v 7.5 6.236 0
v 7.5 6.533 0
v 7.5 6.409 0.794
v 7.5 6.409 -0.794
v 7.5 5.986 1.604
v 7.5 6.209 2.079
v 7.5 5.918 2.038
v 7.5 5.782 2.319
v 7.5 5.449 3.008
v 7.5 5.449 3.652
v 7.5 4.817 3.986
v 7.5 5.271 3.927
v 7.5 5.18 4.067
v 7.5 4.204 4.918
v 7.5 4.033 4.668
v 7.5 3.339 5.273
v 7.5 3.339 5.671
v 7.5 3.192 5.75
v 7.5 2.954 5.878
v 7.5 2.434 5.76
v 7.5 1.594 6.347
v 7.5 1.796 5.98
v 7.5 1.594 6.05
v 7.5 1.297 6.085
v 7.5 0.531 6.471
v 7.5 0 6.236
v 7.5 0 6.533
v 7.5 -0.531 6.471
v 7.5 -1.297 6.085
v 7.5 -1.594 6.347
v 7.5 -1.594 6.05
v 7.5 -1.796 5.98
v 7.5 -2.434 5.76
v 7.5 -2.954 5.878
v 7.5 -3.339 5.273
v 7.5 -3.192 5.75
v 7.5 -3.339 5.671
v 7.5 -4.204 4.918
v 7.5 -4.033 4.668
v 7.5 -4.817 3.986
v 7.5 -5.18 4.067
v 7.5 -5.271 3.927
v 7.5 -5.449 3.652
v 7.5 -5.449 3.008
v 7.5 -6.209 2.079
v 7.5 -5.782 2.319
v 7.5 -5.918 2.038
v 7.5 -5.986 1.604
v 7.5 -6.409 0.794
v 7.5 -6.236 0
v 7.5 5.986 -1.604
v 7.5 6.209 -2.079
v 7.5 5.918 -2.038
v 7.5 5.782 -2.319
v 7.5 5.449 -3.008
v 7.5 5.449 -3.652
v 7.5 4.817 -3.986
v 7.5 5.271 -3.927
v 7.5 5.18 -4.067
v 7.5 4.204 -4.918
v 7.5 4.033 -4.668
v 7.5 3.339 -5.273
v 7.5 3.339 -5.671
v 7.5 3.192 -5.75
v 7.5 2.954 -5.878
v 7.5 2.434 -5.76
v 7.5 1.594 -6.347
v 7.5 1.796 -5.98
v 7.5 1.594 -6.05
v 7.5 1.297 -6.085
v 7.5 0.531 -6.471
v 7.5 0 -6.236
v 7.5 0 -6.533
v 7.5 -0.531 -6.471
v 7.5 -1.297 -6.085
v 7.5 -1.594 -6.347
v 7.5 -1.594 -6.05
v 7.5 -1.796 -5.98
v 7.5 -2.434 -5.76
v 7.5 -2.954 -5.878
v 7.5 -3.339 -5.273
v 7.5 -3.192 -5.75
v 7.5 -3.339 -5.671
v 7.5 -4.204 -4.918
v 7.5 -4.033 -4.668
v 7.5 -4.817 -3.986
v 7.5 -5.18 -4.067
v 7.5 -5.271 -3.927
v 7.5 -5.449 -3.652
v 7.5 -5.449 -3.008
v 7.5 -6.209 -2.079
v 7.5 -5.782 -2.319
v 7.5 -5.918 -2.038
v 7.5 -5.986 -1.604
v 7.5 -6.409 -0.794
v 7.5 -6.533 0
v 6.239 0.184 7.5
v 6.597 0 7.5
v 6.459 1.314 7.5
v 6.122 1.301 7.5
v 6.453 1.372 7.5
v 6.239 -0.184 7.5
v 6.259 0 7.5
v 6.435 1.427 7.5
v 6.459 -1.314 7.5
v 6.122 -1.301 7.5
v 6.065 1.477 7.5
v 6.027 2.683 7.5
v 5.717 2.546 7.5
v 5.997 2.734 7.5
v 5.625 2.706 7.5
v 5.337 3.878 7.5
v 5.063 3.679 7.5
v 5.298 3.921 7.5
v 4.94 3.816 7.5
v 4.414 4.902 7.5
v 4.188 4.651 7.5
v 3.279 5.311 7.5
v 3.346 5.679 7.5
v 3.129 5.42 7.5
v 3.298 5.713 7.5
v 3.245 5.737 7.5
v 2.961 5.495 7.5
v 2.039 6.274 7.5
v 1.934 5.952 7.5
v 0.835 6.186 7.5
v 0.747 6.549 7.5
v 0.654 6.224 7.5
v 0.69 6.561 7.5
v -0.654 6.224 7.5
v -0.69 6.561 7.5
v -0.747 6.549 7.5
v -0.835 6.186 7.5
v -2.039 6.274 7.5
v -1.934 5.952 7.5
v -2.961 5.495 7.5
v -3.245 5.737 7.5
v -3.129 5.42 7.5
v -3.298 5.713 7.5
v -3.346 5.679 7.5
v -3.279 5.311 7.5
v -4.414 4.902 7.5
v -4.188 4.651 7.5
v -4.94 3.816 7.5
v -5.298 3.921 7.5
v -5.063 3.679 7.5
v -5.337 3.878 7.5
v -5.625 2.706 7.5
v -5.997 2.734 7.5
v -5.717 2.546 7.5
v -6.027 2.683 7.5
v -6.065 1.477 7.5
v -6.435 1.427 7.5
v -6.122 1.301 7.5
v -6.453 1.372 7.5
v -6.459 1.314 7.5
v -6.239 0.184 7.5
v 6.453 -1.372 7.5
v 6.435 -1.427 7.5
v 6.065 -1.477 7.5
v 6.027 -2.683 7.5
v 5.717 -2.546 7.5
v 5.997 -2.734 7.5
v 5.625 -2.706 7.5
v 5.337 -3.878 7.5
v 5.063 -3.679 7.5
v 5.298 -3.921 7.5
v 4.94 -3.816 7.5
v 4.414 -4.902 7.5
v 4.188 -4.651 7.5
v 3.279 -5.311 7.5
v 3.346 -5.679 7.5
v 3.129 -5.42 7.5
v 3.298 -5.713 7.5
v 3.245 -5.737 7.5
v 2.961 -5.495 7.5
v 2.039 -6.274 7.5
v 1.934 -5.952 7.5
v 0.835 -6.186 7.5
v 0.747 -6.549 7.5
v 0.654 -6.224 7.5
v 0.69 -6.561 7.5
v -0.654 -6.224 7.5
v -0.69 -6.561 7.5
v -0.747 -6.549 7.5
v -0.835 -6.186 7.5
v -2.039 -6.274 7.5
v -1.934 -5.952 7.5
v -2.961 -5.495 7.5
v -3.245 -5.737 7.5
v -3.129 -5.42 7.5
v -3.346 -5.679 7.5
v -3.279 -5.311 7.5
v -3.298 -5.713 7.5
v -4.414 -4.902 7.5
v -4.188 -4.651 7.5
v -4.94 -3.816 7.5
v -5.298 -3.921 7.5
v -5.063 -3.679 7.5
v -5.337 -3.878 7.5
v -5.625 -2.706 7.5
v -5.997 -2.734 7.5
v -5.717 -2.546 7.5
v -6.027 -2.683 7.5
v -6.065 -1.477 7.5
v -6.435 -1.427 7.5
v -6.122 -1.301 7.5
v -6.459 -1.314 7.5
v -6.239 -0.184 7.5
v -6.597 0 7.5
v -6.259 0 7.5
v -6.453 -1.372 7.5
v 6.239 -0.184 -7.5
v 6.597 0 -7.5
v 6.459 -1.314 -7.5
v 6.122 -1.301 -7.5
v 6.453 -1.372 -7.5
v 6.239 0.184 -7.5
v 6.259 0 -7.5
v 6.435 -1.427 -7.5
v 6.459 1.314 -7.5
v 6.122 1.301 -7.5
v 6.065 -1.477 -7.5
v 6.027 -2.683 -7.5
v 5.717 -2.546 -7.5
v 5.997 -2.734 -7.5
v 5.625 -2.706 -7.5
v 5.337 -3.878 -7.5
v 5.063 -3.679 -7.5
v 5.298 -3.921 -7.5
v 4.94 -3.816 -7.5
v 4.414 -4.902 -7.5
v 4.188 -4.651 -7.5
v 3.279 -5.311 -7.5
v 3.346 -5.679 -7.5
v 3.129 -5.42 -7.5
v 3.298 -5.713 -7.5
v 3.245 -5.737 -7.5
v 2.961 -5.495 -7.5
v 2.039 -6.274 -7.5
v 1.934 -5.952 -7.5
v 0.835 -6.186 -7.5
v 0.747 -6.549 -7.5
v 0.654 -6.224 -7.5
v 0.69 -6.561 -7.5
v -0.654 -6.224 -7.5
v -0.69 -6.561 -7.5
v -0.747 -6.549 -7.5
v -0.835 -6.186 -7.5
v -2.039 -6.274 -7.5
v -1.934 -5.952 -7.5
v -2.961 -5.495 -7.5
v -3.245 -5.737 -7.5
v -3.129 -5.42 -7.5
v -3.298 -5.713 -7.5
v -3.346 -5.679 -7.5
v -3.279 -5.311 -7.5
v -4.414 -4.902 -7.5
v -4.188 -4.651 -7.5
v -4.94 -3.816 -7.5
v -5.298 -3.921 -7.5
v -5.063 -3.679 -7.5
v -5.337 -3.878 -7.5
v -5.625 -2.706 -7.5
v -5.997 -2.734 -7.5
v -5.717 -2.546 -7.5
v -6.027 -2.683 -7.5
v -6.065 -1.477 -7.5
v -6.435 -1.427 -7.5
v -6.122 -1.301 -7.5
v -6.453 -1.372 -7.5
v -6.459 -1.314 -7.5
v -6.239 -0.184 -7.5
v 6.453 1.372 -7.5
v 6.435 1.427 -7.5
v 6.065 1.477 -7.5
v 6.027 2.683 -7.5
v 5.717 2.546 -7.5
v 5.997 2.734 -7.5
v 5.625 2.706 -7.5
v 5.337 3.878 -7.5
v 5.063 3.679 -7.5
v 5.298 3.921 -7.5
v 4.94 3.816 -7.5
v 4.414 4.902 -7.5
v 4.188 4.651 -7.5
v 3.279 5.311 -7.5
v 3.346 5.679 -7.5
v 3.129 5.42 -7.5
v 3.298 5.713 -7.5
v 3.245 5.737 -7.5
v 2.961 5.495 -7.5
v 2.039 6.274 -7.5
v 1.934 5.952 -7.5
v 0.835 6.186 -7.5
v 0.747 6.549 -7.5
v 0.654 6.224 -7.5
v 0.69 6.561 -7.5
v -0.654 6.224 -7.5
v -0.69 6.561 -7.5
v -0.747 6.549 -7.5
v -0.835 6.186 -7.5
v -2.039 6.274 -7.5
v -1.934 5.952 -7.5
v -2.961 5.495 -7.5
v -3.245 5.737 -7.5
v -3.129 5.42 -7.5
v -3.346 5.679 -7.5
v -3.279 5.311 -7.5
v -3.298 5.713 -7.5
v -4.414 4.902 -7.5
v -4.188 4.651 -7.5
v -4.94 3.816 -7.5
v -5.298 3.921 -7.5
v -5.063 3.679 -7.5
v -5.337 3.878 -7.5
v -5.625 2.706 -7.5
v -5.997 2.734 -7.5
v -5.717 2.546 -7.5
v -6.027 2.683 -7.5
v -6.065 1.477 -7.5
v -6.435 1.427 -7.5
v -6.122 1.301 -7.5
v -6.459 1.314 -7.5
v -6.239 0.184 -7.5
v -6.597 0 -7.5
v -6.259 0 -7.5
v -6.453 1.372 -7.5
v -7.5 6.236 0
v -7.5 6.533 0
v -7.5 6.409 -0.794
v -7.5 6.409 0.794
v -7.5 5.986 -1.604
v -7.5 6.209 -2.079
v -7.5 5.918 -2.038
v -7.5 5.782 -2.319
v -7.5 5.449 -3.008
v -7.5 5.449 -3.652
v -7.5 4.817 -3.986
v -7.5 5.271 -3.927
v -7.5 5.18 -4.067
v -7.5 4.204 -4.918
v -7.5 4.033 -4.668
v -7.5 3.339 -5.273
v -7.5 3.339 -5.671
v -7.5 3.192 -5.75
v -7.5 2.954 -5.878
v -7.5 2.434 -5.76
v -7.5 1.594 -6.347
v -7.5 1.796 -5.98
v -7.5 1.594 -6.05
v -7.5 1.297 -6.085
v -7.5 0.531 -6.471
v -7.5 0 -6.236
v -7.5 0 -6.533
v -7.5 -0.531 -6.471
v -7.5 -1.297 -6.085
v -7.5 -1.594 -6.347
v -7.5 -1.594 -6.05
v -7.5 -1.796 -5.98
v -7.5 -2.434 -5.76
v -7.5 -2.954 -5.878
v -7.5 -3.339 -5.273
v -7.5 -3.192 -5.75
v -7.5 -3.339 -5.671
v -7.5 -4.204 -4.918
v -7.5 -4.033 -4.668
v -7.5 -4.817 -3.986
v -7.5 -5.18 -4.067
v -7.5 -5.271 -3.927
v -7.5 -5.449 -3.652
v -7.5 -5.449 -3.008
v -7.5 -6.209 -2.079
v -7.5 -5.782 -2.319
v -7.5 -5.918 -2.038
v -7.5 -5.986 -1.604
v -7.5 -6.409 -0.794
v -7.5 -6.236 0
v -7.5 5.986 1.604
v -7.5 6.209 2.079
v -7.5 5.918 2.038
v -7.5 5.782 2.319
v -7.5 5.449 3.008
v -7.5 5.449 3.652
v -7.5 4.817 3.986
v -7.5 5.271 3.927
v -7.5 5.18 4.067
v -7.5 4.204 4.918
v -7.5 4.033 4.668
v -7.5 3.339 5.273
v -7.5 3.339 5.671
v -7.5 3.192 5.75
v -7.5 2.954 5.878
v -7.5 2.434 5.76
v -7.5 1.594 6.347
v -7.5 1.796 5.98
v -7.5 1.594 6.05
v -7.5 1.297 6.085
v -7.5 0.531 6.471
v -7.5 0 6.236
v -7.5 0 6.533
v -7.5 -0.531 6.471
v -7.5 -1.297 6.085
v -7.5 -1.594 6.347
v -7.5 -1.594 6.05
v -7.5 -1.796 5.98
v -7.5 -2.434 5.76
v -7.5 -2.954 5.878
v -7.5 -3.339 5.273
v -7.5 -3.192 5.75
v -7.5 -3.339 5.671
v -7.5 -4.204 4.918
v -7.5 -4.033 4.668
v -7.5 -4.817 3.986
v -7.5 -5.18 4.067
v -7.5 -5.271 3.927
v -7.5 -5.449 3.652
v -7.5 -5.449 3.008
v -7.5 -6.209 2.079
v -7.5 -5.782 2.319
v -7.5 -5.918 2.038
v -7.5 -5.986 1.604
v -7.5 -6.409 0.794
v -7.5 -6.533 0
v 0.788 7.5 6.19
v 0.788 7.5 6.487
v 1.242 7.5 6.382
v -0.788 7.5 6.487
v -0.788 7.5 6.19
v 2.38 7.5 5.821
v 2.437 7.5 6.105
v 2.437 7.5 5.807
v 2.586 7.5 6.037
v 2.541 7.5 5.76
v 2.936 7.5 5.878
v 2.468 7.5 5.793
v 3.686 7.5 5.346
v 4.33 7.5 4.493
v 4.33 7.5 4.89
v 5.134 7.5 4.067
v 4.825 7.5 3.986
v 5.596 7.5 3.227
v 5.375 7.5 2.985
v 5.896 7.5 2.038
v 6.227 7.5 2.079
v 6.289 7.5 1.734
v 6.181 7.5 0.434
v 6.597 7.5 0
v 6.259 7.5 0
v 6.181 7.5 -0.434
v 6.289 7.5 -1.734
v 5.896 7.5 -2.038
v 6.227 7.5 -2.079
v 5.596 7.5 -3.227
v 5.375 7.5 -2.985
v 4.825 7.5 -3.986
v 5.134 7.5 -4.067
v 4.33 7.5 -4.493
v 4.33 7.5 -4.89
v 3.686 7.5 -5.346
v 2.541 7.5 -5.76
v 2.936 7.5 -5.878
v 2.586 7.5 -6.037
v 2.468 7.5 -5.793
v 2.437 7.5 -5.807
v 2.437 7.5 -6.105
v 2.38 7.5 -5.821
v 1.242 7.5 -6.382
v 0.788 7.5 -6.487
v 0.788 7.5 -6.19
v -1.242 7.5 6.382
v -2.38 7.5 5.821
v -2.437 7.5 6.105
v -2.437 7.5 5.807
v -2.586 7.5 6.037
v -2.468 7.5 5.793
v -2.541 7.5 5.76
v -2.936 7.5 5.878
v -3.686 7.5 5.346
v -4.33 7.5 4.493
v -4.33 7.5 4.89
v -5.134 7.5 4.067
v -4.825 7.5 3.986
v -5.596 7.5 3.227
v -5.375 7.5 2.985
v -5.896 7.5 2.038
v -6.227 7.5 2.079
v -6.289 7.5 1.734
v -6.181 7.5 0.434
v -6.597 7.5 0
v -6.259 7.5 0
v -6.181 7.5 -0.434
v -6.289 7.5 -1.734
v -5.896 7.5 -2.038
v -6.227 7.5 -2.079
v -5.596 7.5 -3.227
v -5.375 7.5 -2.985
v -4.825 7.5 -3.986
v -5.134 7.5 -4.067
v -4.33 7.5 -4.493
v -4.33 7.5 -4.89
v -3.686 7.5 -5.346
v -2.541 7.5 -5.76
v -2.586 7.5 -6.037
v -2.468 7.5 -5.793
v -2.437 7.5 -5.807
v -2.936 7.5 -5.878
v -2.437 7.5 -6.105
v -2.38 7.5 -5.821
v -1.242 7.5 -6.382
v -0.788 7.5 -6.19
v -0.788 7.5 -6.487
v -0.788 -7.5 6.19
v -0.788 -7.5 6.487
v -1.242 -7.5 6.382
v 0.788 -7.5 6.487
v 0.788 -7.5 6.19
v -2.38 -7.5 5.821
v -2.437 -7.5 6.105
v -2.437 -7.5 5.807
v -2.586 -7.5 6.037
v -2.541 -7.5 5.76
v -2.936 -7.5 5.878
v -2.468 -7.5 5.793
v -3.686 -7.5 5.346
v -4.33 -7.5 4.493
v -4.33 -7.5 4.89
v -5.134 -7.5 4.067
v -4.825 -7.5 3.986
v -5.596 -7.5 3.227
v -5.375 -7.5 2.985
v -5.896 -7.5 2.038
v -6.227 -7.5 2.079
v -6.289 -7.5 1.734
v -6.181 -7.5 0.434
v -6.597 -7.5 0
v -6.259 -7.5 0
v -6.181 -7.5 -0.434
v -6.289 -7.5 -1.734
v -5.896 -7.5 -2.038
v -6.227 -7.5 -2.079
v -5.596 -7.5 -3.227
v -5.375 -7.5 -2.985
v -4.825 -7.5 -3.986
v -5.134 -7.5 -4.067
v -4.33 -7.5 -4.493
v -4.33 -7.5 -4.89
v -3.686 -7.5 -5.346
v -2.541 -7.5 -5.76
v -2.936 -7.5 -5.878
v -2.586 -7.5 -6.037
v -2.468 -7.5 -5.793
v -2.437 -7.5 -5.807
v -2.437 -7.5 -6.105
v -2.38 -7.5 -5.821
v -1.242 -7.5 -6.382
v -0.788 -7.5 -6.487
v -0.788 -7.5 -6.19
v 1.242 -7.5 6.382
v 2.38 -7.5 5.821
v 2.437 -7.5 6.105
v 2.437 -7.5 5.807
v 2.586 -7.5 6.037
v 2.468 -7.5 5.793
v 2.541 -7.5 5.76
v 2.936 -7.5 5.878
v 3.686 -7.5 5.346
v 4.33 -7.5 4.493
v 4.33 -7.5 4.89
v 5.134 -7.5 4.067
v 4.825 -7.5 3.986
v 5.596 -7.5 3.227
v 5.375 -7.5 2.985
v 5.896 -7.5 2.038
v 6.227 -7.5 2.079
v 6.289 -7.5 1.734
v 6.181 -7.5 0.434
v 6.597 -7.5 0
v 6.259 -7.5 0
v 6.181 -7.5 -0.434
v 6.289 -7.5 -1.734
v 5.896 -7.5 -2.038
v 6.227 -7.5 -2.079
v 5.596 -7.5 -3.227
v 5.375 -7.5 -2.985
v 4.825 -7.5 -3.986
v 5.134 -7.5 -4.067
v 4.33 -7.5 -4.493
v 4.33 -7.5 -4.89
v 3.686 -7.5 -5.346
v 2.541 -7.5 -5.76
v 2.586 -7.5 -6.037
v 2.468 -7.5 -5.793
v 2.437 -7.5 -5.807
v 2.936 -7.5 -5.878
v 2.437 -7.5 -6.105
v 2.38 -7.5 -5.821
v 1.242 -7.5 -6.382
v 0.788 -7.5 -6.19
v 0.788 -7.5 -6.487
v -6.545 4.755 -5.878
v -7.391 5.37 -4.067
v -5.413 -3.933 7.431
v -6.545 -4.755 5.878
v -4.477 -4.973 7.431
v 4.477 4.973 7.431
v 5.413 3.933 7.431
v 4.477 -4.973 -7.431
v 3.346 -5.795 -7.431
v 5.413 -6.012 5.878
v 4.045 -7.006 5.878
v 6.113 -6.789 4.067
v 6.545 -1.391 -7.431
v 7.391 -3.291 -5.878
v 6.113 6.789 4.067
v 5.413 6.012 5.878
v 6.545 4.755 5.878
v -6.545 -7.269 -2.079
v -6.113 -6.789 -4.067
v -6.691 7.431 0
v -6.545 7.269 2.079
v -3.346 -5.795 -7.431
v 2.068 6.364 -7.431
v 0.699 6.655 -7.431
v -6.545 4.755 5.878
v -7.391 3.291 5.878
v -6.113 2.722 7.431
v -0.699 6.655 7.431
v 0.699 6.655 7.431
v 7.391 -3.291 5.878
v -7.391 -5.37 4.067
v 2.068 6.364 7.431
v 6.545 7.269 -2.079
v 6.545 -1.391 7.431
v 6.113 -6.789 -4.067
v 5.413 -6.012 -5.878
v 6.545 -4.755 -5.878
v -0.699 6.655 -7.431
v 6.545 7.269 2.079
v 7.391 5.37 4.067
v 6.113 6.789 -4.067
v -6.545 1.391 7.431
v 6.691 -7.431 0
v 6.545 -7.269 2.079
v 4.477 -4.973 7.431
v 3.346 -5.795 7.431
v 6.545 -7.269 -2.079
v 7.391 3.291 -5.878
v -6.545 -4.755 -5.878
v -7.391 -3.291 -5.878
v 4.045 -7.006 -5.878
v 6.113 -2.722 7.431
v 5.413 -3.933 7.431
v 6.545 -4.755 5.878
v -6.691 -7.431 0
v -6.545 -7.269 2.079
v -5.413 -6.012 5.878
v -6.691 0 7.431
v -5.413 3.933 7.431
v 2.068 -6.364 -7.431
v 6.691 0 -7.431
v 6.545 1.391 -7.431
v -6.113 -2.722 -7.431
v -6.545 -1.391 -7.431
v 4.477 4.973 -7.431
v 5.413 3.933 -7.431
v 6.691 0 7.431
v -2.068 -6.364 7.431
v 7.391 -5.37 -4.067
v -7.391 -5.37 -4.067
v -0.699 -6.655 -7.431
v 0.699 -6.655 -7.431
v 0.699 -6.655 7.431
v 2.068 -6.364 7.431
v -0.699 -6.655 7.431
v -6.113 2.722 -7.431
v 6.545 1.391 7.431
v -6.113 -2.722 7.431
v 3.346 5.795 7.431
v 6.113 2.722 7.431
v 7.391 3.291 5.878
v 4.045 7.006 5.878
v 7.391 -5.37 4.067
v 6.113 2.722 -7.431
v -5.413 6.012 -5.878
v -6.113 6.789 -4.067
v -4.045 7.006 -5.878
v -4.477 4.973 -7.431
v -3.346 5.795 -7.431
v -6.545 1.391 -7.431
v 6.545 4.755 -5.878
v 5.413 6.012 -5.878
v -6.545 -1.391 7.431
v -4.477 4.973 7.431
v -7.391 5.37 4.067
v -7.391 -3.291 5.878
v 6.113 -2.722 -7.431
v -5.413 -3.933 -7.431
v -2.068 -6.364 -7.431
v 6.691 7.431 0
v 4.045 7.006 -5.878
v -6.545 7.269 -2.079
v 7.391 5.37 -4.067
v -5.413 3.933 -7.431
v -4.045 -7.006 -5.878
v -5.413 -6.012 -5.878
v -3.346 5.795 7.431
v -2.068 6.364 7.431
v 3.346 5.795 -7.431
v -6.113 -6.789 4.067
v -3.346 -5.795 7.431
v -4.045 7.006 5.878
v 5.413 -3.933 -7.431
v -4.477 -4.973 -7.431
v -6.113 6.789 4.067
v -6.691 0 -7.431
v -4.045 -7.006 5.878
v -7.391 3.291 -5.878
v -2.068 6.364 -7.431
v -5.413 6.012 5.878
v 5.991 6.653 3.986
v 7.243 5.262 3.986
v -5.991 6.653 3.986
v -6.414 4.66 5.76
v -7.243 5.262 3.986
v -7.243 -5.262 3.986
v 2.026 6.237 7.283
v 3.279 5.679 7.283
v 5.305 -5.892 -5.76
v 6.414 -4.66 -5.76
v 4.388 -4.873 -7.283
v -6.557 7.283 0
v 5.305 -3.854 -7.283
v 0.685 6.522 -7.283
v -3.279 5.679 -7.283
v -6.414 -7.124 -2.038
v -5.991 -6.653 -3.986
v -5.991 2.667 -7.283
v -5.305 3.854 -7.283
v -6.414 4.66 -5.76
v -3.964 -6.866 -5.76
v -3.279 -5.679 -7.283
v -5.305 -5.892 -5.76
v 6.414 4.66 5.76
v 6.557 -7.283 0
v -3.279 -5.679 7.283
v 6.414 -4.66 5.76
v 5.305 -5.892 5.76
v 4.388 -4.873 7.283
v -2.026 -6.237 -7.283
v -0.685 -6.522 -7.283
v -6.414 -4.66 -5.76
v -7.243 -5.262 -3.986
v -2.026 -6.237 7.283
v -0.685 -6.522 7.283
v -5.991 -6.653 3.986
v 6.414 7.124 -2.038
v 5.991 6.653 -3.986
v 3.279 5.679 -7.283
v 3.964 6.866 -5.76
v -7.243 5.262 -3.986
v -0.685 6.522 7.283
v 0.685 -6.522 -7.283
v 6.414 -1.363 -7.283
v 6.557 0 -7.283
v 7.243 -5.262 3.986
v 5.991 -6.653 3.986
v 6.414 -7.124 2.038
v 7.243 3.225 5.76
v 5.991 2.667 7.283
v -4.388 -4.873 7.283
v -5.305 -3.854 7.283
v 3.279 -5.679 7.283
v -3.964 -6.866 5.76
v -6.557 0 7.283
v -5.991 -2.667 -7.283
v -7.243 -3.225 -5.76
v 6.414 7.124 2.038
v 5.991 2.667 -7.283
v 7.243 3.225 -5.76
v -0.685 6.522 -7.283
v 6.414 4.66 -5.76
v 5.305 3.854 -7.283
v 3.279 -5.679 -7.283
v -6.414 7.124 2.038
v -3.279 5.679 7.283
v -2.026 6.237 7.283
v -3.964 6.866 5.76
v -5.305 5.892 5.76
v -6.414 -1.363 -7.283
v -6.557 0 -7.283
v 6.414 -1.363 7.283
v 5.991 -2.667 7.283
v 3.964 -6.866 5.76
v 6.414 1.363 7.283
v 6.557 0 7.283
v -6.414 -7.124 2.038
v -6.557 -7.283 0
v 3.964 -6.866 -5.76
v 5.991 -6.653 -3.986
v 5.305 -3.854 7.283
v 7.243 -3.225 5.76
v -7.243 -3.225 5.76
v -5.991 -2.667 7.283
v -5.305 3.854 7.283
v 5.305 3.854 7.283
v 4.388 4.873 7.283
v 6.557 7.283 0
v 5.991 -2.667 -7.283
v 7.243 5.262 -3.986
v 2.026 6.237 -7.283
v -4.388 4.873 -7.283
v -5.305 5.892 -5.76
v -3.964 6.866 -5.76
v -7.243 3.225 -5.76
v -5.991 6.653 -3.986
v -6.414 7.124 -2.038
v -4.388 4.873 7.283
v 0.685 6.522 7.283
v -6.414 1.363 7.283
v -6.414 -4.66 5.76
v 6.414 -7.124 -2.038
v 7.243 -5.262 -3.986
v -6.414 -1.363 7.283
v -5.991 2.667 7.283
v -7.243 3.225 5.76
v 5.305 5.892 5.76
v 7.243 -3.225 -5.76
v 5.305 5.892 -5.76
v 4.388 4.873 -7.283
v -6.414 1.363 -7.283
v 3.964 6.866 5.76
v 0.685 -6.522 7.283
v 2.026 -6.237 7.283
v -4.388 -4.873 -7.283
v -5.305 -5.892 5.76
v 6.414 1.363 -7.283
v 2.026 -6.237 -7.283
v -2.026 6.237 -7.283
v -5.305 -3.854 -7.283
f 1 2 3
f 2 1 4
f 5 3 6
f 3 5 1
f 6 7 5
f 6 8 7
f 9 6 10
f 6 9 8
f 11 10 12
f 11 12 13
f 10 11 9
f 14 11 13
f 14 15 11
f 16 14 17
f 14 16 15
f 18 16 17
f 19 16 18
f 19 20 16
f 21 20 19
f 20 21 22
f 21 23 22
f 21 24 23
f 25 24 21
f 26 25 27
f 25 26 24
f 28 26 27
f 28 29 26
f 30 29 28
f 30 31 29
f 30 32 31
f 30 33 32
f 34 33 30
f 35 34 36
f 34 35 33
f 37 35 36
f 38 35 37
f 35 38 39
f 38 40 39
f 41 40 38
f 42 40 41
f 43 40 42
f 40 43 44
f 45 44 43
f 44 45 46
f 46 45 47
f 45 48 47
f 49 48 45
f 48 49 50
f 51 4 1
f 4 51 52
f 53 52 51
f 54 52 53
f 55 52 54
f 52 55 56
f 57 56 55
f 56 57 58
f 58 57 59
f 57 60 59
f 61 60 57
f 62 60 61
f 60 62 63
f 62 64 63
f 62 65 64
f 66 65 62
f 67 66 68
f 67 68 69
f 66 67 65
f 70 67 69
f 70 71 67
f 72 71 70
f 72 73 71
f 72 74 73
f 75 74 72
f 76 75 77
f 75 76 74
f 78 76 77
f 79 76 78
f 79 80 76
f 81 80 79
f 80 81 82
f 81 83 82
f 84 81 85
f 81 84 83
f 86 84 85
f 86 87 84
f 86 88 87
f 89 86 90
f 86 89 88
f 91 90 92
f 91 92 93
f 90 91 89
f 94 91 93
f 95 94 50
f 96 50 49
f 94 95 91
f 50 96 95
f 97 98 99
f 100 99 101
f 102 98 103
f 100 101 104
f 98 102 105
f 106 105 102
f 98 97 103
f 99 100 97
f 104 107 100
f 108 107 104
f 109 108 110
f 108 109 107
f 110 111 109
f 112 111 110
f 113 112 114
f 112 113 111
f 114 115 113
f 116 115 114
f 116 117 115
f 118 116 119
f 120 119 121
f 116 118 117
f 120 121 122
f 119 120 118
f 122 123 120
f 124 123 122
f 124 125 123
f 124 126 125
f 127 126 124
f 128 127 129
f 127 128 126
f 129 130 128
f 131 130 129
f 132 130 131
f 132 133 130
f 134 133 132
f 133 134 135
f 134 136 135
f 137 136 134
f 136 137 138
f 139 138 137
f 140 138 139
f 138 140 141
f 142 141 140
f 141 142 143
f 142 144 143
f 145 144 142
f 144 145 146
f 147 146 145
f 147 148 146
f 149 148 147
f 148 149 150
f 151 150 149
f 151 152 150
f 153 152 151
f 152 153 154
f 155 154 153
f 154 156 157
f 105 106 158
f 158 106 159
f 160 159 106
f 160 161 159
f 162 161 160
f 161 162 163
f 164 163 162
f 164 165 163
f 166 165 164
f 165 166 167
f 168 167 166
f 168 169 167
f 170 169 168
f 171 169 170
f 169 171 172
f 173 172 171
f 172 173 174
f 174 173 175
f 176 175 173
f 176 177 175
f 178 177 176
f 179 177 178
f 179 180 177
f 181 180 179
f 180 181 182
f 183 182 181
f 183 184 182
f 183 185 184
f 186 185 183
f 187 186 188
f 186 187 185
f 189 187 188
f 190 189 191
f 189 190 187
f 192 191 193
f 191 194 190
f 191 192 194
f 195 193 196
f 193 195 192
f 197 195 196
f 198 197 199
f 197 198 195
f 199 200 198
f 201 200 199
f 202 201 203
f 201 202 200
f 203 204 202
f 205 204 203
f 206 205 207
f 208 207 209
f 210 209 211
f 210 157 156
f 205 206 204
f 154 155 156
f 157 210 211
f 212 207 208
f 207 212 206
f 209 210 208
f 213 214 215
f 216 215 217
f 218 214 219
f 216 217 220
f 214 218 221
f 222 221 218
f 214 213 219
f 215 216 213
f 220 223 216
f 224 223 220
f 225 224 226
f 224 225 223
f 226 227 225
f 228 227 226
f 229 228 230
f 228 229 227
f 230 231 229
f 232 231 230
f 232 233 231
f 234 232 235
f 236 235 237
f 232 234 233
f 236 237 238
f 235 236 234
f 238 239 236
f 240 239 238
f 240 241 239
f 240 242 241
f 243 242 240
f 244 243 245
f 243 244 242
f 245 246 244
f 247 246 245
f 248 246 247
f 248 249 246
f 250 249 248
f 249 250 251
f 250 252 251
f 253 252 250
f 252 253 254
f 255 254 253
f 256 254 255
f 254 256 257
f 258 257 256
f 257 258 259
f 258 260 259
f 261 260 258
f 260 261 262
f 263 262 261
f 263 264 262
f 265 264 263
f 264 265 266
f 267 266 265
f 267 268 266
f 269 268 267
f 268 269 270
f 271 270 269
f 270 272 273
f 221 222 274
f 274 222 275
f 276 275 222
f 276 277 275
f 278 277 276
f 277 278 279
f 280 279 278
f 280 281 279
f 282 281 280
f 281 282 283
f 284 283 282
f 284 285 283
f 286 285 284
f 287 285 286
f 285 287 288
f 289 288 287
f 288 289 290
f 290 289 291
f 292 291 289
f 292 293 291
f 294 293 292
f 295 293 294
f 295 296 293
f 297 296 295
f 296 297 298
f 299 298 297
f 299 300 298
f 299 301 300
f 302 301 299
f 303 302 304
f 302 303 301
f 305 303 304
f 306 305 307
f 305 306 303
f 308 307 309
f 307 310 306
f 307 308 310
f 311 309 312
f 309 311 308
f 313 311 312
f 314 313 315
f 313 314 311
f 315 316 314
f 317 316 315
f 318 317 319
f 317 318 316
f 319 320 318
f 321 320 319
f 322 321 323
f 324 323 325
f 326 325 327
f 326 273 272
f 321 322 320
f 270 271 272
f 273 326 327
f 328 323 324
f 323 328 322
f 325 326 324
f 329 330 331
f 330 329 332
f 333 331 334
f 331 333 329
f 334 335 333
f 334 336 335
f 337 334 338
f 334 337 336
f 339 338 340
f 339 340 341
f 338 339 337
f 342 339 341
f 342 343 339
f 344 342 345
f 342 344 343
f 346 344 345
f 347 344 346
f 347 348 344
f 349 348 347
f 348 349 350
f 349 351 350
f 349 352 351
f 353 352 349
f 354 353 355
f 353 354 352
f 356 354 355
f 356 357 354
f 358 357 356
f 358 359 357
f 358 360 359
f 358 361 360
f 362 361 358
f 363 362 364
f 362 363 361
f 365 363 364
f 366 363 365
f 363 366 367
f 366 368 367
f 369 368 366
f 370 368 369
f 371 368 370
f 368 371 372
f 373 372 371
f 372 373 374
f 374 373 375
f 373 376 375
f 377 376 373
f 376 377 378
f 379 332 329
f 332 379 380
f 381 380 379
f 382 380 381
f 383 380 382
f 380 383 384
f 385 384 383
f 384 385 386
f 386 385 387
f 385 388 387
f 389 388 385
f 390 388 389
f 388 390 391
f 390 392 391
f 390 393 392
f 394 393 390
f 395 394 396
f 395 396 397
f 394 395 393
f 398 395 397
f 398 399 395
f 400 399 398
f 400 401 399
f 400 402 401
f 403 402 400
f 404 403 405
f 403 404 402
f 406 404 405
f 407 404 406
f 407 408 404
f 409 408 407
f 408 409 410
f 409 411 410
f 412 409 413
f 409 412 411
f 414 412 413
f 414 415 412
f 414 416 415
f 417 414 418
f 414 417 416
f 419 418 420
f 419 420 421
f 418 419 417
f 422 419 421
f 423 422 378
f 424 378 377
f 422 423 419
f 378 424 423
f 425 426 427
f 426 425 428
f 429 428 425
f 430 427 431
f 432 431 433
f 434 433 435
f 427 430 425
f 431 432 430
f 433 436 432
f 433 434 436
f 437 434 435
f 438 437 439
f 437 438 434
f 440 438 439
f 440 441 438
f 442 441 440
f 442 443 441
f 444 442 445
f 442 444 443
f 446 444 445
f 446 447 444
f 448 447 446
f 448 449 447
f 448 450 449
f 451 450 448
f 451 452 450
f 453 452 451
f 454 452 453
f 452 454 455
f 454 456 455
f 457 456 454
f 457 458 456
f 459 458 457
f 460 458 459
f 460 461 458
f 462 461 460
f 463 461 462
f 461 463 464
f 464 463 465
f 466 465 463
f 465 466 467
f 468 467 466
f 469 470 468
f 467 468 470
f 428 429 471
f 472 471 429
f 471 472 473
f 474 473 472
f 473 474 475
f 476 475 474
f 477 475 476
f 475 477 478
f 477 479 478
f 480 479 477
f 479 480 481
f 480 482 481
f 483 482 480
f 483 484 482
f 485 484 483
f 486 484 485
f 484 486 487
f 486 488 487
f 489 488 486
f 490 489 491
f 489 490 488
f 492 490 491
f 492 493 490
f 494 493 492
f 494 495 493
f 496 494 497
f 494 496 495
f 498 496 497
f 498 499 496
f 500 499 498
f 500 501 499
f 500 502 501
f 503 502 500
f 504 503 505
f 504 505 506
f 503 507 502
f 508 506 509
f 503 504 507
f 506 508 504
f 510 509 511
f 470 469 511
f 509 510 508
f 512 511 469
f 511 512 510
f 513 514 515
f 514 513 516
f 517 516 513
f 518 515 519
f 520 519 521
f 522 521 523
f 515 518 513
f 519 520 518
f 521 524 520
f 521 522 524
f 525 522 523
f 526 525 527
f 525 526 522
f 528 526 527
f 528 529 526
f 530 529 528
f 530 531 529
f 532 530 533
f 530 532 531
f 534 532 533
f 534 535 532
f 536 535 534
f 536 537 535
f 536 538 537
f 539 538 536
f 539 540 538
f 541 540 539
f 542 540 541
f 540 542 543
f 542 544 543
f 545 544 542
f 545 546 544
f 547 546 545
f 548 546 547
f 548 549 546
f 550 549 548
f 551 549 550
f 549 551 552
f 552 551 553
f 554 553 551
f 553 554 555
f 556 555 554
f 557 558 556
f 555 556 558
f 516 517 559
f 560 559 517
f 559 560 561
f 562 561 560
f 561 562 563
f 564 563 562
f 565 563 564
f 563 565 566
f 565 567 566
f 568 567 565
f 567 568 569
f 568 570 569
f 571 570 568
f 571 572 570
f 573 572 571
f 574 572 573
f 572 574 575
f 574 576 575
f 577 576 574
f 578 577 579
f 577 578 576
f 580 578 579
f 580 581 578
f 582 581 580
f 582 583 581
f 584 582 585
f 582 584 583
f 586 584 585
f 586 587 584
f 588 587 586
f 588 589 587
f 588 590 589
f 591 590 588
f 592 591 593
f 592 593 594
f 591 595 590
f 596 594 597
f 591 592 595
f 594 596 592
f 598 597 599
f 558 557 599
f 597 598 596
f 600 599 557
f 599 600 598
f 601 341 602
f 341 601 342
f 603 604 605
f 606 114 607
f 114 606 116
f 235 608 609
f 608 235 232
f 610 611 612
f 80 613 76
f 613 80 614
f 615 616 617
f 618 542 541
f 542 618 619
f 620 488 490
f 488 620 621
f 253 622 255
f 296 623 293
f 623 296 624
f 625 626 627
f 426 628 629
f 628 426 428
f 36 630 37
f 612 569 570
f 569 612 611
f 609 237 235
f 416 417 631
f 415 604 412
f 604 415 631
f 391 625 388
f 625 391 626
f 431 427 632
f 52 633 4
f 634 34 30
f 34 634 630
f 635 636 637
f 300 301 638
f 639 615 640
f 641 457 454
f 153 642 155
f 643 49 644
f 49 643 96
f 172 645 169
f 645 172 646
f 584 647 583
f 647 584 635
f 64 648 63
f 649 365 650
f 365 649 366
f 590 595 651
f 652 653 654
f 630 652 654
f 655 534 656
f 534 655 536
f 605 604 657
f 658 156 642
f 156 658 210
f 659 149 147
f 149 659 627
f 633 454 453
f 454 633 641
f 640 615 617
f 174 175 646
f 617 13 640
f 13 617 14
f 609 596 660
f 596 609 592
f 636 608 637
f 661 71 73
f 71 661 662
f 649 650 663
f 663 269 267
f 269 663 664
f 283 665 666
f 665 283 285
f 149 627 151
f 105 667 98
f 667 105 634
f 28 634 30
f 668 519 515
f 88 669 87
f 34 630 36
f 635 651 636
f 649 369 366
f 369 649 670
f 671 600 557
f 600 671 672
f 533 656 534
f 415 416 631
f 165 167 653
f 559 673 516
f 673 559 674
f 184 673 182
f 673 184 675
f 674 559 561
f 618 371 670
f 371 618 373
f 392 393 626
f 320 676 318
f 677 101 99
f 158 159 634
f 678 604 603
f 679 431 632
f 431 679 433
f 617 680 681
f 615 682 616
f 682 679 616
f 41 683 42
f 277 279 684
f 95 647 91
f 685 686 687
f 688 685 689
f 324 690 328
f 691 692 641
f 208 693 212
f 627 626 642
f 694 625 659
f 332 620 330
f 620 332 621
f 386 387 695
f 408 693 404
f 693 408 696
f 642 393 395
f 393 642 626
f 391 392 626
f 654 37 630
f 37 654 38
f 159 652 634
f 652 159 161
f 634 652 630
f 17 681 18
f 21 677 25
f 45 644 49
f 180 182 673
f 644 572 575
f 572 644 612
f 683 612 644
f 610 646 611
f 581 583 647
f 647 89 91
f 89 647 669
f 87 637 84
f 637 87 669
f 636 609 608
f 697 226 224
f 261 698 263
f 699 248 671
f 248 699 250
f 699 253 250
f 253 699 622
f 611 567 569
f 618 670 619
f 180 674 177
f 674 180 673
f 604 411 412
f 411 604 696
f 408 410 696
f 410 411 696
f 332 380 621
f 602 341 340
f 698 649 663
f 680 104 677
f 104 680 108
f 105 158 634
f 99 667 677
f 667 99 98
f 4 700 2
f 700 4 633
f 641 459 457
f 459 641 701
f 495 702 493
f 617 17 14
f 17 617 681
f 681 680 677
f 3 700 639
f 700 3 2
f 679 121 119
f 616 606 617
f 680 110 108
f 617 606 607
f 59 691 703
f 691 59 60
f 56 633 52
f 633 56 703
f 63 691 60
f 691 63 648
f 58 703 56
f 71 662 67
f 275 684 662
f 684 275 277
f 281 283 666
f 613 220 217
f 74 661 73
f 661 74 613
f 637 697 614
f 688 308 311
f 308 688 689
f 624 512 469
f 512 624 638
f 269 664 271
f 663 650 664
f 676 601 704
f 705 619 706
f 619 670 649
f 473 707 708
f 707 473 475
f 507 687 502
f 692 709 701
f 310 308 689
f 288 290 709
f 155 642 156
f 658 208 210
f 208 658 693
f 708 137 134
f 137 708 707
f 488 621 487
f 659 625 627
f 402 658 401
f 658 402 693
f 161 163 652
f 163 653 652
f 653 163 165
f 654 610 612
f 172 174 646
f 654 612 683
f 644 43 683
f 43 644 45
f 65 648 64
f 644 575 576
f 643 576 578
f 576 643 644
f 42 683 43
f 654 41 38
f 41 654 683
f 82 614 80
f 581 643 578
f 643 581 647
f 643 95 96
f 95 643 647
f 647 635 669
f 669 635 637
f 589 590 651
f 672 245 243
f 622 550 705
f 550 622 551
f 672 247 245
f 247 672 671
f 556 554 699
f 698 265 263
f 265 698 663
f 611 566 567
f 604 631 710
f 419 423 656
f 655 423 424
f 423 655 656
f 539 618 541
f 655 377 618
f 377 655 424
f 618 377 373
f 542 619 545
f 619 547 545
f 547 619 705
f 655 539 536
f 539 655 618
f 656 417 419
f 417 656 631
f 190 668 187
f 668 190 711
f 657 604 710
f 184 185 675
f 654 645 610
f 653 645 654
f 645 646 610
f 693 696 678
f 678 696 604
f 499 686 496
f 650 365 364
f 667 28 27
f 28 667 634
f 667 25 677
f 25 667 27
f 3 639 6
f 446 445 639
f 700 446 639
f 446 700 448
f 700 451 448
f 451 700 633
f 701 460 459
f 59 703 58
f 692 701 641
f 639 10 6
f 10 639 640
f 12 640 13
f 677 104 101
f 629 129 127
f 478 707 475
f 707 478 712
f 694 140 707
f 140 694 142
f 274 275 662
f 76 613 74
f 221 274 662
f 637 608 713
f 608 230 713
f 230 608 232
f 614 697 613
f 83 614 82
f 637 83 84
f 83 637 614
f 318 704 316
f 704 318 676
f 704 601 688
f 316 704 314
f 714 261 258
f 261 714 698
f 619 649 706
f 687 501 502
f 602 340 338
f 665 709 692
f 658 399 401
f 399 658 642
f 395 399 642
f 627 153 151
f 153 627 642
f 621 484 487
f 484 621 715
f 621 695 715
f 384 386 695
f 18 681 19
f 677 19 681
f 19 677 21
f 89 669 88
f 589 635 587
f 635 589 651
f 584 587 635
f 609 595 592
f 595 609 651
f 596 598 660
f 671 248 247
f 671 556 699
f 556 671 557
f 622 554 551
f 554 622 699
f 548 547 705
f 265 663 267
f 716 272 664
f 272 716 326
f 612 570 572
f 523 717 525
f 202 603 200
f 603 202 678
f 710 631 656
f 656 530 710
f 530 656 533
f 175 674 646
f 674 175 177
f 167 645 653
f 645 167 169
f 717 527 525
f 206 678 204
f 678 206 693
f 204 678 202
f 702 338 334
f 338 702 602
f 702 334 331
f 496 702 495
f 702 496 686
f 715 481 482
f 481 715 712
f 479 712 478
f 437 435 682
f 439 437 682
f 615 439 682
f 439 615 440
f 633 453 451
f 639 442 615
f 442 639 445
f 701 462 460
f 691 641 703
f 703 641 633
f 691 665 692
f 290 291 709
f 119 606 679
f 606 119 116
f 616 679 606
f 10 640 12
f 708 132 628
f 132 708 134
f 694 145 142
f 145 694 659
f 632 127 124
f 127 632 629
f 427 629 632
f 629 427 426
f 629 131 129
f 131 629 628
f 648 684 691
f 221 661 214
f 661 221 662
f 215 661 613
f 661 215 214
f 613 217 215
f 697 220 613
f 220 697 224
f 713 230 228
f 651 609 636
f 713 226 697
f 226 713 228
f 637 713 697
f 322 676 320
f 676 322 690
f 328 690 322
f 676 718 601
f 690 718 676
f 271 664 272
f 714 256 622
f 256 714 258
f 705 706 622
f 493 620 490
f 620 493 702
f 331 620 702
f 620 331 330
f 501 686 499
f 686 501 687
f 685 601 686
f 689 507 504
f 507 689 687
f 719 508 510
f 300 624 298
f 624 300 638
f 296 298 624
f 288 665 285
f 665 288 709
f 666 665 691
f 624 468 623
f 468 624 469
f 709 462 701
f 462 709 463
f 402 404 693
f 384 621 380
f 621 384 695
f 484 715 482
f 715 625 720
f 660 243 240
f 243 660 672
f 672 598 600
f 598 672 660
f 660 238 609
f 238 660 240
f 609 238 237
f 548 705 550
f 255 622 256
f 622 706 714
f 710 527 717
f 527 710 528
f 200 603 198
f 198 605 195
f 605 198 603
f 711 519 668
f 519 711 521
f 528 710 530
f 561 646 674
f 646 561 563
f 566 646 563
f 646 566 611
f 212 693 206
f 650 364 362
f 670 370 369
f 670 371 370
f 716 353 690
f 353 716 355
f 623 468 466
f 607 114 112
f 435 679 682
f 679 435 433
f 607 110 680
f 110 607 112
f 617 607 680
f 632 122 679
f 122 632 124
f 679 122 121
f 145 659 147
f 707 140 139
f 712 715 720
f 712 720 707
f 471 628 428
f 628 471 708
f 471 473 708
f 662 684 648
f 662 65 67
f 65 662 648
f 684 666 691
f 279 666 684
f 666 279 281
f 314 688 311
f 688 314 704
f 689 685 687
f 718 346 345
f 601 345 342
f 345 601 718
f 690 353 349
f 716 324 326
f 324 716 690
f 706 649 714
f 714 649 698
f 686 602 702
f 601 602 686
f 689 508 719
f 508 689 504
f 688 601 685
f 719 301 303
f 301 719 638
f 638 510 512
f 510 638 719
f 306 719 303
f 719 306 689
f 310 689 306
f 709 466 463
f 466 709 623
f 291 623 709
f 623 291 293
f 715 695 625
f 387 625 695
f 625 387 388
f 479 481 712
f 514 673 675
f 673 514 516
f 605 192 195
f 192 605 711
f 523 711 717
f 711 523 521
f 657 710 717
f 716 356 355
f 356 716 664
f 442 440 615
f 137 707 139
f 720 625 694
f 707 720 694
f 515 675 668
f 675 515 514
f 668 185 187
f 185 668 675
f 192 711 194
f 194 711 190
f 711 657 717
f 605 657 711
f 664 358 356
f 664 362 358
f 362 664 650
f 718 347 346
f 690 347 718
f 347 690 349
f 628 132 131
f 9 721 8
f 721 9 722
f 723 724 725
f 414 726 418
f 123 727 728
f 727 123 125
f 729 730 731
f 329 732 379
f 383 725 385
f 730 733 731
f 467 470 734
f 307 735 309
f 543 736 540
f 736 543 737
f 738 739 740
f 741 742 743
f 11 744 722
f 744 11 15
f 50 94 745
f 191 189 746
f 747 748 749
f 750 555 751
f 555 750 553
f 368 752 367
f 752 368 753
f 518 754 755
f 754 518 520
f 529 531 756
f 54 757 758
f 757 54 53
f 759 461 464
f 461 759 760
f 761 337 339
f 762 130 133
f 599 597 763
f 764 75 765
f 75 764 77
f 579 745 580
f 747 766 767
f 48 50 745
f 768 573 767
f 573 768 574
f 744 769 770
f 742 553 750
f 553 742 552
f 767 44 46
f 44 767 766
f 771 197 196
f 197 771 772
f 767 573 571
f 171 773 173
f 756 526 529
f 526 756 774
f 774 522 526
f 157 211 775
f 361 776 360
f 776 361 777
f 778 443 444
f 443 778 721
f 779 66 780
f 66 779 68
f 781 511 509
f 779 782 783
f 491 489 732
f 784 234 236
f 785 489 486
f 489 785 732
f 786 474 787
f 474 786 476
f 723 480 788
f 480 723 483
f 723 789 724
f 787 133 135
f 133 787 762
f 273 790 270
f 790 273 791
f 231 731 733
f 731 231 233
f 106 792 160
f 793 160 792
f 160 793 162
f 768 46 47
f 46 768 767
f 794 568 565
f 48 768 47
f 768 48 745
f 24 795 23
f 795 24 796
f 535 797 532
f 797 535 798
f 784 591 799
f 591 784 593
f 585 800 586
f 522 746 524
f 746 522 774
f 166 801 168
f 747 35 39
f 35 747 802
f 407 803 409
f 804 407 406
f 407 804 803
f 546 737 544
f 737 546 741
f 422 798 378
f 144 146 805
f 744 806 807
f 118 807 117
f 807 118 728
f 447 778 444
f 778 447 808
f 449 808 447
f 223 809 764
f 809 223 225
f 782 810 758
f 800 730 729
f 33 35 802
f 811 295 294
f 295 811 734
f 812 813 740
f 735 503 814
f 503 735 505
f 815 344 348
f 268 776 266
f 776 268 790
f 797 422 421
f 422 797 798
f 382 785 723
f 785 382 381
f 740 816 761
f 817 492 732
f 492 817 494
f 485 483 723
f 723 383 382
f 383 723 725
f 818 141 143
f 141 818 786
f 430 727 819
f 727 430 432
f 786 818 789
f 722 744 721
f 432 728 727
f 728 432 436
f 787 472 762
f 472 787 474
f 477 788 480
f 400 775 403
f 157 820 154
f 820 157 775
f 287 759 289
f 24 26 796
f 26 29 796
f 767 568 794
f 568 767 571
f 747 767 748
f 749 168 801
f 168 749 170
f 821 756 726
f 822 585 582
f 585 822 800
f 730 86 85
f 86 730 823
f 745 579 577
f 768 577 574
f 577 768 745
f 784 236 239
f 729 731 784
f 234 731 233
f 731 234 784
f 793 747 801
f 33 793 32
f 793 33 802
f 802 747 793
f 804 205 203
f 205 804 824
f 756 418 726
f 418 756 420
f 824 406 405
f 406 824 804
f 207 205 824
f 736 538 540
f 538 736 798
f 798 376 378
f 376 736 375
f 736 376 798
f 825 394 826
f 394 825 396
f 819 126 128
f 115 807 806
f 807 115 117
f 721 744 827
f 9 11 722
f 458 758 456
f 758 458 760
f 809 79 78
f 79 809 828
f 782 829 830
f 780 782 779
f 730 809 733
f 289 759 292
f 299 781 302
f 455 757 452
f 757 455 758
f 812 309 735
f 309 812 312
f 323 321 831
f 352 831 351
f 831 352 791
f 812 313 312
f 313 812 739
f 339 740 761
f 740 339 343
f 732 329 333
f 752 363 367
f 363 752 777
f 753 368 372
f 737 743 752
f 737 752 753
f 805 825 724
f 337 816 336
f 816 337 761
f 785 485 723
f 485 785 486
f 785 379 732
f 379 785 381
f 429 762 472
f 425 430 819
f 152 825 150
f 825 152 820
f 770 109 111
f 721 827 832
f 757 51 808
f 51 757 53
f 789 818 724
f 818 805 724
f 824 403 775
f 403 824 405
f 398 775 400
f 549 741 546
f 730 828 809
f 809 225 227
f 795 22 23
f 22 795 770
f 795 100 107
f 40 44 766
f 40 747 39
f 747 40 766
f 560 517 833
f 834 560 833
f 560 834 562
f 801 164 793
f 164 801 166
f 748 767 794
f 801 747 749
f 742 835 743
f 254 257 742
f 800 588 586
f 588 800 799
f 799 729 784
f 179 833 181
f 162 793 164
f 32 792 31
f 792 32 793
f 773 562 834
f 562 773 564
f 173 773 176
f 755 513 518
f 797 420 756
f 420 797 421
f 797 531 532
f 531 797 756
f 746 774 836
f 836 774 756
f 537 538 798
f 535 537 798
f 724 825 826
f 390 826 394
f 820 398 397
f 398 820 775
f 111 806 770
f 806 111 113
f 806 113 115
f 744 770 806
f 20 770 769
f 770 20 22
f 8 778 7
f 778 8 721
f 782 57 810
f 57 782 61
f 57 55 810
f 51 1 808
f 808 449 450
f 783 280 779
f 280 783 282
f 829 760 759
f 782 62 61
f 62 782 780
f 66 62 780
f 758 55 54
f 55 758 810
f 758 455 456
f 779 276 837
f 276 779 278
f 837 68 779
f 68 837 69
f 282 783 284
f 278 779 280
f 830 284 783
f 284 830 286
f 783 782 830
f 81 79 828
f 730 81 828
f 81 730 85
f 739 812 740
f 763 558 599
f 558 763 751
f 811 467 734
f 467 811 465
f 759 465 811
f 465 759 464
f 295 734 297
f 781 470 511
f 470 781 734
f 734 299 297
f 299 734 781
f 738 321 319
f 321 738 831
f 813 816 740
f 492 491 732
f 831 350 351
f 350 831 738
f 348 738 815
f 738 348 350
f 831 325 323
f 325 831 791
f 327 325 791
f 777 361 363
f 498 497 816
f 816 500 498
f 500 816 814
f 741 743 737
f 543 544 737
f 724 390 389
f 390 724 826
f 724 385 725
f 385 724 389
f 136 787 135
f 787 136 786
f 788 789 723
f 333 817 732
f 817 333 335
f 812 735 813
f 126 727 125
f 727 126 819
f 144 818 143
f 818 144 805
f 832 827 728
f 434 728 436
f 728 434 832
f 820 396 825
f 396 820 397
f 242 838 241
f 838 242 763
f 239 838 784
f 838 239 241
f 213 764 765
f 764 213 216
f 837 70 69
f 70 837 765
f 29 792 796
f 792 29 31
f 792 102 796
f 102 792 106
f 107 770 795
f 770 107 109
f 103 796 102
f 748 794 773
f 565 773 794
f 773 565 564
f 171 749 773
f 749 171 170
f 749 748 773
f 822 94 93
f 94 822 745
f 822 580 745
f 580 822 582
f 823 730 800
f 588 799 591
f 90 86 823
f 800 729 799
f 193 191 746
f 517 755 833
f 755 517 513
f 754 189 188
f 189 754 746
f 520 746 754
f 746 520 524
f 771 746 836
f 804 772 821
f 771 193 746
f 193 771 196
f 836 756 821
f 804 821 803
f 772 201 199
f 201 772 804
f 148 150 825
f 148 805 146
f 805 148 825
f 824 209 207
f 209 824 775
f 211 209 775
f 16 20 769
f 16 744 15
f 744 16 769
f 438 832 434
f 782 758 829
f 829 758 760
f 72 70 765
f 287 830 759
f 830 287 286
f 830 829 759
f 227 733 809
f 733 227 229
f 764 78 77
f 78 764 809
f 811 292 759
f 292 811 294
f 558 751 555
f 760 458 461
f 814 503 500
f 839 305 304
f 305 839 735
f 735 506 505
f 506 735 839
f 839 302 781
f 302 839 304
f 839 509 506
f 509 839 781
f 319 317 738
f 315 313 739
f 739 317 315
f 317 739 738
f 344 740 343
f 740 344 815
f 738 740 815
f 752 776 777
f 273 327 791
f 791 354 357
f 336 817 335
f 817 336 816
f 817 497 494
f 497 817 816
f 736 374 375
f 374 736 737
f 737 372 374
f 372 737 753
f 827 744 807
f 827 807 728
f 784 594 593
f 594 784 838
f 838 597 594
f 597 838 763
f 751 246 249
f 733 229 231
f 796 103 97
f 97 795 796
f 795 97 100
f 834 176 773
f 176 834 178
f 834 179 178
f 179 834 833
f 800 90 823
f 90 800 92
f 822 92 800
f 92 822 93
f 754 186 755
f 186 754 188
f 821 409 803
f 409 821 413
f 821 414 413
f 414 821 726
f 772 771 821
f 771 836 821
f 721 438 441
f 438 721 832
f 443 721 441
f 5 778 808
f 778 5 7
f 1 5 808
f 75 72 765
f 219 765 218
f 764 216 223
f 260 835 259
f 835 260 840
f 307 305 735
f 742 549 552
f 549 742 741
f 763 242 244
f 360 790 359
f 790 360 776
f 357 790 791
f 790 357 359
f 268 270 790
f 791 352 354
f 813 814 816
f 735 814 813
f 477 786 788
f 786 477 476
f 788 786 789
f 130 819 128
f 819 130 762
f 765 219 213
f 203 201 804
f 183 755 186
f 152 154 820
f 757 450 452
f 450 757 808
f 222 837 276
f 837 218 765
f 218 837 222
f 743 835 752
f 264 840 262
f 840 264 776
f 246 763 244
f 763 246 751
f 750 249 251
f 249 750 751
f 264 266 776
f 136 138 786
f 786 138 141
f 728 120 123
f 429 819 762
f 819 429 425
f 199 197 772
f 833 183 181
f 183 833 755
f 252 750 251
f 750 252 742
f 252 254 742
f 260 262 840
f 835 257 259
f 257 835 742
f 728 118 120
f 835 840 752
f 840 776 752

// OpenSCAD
// CSG.scad - Basic example of CSG usage

translate([0,0,0]) {
    difference(){
        intersection() {
            cube(15, center=true);
            sphere(10);
        }
        sphere(9.8);
    }
    
}




echo(version=version());
// Written by Marius Kintel <marius@kintel.net>
//
// To the extent possible under law, the author(s) have dedicated all
// copyright and related and neighboring rights to this software to the
// public domain worldwide. This software is distributed without any
// warranty.
//
// You should have received a copy of the CC0 Public Domain
// Dedication along with this software.
// If not, see <http://creativecommons.org/publicdomain/zero/1.0/>.
